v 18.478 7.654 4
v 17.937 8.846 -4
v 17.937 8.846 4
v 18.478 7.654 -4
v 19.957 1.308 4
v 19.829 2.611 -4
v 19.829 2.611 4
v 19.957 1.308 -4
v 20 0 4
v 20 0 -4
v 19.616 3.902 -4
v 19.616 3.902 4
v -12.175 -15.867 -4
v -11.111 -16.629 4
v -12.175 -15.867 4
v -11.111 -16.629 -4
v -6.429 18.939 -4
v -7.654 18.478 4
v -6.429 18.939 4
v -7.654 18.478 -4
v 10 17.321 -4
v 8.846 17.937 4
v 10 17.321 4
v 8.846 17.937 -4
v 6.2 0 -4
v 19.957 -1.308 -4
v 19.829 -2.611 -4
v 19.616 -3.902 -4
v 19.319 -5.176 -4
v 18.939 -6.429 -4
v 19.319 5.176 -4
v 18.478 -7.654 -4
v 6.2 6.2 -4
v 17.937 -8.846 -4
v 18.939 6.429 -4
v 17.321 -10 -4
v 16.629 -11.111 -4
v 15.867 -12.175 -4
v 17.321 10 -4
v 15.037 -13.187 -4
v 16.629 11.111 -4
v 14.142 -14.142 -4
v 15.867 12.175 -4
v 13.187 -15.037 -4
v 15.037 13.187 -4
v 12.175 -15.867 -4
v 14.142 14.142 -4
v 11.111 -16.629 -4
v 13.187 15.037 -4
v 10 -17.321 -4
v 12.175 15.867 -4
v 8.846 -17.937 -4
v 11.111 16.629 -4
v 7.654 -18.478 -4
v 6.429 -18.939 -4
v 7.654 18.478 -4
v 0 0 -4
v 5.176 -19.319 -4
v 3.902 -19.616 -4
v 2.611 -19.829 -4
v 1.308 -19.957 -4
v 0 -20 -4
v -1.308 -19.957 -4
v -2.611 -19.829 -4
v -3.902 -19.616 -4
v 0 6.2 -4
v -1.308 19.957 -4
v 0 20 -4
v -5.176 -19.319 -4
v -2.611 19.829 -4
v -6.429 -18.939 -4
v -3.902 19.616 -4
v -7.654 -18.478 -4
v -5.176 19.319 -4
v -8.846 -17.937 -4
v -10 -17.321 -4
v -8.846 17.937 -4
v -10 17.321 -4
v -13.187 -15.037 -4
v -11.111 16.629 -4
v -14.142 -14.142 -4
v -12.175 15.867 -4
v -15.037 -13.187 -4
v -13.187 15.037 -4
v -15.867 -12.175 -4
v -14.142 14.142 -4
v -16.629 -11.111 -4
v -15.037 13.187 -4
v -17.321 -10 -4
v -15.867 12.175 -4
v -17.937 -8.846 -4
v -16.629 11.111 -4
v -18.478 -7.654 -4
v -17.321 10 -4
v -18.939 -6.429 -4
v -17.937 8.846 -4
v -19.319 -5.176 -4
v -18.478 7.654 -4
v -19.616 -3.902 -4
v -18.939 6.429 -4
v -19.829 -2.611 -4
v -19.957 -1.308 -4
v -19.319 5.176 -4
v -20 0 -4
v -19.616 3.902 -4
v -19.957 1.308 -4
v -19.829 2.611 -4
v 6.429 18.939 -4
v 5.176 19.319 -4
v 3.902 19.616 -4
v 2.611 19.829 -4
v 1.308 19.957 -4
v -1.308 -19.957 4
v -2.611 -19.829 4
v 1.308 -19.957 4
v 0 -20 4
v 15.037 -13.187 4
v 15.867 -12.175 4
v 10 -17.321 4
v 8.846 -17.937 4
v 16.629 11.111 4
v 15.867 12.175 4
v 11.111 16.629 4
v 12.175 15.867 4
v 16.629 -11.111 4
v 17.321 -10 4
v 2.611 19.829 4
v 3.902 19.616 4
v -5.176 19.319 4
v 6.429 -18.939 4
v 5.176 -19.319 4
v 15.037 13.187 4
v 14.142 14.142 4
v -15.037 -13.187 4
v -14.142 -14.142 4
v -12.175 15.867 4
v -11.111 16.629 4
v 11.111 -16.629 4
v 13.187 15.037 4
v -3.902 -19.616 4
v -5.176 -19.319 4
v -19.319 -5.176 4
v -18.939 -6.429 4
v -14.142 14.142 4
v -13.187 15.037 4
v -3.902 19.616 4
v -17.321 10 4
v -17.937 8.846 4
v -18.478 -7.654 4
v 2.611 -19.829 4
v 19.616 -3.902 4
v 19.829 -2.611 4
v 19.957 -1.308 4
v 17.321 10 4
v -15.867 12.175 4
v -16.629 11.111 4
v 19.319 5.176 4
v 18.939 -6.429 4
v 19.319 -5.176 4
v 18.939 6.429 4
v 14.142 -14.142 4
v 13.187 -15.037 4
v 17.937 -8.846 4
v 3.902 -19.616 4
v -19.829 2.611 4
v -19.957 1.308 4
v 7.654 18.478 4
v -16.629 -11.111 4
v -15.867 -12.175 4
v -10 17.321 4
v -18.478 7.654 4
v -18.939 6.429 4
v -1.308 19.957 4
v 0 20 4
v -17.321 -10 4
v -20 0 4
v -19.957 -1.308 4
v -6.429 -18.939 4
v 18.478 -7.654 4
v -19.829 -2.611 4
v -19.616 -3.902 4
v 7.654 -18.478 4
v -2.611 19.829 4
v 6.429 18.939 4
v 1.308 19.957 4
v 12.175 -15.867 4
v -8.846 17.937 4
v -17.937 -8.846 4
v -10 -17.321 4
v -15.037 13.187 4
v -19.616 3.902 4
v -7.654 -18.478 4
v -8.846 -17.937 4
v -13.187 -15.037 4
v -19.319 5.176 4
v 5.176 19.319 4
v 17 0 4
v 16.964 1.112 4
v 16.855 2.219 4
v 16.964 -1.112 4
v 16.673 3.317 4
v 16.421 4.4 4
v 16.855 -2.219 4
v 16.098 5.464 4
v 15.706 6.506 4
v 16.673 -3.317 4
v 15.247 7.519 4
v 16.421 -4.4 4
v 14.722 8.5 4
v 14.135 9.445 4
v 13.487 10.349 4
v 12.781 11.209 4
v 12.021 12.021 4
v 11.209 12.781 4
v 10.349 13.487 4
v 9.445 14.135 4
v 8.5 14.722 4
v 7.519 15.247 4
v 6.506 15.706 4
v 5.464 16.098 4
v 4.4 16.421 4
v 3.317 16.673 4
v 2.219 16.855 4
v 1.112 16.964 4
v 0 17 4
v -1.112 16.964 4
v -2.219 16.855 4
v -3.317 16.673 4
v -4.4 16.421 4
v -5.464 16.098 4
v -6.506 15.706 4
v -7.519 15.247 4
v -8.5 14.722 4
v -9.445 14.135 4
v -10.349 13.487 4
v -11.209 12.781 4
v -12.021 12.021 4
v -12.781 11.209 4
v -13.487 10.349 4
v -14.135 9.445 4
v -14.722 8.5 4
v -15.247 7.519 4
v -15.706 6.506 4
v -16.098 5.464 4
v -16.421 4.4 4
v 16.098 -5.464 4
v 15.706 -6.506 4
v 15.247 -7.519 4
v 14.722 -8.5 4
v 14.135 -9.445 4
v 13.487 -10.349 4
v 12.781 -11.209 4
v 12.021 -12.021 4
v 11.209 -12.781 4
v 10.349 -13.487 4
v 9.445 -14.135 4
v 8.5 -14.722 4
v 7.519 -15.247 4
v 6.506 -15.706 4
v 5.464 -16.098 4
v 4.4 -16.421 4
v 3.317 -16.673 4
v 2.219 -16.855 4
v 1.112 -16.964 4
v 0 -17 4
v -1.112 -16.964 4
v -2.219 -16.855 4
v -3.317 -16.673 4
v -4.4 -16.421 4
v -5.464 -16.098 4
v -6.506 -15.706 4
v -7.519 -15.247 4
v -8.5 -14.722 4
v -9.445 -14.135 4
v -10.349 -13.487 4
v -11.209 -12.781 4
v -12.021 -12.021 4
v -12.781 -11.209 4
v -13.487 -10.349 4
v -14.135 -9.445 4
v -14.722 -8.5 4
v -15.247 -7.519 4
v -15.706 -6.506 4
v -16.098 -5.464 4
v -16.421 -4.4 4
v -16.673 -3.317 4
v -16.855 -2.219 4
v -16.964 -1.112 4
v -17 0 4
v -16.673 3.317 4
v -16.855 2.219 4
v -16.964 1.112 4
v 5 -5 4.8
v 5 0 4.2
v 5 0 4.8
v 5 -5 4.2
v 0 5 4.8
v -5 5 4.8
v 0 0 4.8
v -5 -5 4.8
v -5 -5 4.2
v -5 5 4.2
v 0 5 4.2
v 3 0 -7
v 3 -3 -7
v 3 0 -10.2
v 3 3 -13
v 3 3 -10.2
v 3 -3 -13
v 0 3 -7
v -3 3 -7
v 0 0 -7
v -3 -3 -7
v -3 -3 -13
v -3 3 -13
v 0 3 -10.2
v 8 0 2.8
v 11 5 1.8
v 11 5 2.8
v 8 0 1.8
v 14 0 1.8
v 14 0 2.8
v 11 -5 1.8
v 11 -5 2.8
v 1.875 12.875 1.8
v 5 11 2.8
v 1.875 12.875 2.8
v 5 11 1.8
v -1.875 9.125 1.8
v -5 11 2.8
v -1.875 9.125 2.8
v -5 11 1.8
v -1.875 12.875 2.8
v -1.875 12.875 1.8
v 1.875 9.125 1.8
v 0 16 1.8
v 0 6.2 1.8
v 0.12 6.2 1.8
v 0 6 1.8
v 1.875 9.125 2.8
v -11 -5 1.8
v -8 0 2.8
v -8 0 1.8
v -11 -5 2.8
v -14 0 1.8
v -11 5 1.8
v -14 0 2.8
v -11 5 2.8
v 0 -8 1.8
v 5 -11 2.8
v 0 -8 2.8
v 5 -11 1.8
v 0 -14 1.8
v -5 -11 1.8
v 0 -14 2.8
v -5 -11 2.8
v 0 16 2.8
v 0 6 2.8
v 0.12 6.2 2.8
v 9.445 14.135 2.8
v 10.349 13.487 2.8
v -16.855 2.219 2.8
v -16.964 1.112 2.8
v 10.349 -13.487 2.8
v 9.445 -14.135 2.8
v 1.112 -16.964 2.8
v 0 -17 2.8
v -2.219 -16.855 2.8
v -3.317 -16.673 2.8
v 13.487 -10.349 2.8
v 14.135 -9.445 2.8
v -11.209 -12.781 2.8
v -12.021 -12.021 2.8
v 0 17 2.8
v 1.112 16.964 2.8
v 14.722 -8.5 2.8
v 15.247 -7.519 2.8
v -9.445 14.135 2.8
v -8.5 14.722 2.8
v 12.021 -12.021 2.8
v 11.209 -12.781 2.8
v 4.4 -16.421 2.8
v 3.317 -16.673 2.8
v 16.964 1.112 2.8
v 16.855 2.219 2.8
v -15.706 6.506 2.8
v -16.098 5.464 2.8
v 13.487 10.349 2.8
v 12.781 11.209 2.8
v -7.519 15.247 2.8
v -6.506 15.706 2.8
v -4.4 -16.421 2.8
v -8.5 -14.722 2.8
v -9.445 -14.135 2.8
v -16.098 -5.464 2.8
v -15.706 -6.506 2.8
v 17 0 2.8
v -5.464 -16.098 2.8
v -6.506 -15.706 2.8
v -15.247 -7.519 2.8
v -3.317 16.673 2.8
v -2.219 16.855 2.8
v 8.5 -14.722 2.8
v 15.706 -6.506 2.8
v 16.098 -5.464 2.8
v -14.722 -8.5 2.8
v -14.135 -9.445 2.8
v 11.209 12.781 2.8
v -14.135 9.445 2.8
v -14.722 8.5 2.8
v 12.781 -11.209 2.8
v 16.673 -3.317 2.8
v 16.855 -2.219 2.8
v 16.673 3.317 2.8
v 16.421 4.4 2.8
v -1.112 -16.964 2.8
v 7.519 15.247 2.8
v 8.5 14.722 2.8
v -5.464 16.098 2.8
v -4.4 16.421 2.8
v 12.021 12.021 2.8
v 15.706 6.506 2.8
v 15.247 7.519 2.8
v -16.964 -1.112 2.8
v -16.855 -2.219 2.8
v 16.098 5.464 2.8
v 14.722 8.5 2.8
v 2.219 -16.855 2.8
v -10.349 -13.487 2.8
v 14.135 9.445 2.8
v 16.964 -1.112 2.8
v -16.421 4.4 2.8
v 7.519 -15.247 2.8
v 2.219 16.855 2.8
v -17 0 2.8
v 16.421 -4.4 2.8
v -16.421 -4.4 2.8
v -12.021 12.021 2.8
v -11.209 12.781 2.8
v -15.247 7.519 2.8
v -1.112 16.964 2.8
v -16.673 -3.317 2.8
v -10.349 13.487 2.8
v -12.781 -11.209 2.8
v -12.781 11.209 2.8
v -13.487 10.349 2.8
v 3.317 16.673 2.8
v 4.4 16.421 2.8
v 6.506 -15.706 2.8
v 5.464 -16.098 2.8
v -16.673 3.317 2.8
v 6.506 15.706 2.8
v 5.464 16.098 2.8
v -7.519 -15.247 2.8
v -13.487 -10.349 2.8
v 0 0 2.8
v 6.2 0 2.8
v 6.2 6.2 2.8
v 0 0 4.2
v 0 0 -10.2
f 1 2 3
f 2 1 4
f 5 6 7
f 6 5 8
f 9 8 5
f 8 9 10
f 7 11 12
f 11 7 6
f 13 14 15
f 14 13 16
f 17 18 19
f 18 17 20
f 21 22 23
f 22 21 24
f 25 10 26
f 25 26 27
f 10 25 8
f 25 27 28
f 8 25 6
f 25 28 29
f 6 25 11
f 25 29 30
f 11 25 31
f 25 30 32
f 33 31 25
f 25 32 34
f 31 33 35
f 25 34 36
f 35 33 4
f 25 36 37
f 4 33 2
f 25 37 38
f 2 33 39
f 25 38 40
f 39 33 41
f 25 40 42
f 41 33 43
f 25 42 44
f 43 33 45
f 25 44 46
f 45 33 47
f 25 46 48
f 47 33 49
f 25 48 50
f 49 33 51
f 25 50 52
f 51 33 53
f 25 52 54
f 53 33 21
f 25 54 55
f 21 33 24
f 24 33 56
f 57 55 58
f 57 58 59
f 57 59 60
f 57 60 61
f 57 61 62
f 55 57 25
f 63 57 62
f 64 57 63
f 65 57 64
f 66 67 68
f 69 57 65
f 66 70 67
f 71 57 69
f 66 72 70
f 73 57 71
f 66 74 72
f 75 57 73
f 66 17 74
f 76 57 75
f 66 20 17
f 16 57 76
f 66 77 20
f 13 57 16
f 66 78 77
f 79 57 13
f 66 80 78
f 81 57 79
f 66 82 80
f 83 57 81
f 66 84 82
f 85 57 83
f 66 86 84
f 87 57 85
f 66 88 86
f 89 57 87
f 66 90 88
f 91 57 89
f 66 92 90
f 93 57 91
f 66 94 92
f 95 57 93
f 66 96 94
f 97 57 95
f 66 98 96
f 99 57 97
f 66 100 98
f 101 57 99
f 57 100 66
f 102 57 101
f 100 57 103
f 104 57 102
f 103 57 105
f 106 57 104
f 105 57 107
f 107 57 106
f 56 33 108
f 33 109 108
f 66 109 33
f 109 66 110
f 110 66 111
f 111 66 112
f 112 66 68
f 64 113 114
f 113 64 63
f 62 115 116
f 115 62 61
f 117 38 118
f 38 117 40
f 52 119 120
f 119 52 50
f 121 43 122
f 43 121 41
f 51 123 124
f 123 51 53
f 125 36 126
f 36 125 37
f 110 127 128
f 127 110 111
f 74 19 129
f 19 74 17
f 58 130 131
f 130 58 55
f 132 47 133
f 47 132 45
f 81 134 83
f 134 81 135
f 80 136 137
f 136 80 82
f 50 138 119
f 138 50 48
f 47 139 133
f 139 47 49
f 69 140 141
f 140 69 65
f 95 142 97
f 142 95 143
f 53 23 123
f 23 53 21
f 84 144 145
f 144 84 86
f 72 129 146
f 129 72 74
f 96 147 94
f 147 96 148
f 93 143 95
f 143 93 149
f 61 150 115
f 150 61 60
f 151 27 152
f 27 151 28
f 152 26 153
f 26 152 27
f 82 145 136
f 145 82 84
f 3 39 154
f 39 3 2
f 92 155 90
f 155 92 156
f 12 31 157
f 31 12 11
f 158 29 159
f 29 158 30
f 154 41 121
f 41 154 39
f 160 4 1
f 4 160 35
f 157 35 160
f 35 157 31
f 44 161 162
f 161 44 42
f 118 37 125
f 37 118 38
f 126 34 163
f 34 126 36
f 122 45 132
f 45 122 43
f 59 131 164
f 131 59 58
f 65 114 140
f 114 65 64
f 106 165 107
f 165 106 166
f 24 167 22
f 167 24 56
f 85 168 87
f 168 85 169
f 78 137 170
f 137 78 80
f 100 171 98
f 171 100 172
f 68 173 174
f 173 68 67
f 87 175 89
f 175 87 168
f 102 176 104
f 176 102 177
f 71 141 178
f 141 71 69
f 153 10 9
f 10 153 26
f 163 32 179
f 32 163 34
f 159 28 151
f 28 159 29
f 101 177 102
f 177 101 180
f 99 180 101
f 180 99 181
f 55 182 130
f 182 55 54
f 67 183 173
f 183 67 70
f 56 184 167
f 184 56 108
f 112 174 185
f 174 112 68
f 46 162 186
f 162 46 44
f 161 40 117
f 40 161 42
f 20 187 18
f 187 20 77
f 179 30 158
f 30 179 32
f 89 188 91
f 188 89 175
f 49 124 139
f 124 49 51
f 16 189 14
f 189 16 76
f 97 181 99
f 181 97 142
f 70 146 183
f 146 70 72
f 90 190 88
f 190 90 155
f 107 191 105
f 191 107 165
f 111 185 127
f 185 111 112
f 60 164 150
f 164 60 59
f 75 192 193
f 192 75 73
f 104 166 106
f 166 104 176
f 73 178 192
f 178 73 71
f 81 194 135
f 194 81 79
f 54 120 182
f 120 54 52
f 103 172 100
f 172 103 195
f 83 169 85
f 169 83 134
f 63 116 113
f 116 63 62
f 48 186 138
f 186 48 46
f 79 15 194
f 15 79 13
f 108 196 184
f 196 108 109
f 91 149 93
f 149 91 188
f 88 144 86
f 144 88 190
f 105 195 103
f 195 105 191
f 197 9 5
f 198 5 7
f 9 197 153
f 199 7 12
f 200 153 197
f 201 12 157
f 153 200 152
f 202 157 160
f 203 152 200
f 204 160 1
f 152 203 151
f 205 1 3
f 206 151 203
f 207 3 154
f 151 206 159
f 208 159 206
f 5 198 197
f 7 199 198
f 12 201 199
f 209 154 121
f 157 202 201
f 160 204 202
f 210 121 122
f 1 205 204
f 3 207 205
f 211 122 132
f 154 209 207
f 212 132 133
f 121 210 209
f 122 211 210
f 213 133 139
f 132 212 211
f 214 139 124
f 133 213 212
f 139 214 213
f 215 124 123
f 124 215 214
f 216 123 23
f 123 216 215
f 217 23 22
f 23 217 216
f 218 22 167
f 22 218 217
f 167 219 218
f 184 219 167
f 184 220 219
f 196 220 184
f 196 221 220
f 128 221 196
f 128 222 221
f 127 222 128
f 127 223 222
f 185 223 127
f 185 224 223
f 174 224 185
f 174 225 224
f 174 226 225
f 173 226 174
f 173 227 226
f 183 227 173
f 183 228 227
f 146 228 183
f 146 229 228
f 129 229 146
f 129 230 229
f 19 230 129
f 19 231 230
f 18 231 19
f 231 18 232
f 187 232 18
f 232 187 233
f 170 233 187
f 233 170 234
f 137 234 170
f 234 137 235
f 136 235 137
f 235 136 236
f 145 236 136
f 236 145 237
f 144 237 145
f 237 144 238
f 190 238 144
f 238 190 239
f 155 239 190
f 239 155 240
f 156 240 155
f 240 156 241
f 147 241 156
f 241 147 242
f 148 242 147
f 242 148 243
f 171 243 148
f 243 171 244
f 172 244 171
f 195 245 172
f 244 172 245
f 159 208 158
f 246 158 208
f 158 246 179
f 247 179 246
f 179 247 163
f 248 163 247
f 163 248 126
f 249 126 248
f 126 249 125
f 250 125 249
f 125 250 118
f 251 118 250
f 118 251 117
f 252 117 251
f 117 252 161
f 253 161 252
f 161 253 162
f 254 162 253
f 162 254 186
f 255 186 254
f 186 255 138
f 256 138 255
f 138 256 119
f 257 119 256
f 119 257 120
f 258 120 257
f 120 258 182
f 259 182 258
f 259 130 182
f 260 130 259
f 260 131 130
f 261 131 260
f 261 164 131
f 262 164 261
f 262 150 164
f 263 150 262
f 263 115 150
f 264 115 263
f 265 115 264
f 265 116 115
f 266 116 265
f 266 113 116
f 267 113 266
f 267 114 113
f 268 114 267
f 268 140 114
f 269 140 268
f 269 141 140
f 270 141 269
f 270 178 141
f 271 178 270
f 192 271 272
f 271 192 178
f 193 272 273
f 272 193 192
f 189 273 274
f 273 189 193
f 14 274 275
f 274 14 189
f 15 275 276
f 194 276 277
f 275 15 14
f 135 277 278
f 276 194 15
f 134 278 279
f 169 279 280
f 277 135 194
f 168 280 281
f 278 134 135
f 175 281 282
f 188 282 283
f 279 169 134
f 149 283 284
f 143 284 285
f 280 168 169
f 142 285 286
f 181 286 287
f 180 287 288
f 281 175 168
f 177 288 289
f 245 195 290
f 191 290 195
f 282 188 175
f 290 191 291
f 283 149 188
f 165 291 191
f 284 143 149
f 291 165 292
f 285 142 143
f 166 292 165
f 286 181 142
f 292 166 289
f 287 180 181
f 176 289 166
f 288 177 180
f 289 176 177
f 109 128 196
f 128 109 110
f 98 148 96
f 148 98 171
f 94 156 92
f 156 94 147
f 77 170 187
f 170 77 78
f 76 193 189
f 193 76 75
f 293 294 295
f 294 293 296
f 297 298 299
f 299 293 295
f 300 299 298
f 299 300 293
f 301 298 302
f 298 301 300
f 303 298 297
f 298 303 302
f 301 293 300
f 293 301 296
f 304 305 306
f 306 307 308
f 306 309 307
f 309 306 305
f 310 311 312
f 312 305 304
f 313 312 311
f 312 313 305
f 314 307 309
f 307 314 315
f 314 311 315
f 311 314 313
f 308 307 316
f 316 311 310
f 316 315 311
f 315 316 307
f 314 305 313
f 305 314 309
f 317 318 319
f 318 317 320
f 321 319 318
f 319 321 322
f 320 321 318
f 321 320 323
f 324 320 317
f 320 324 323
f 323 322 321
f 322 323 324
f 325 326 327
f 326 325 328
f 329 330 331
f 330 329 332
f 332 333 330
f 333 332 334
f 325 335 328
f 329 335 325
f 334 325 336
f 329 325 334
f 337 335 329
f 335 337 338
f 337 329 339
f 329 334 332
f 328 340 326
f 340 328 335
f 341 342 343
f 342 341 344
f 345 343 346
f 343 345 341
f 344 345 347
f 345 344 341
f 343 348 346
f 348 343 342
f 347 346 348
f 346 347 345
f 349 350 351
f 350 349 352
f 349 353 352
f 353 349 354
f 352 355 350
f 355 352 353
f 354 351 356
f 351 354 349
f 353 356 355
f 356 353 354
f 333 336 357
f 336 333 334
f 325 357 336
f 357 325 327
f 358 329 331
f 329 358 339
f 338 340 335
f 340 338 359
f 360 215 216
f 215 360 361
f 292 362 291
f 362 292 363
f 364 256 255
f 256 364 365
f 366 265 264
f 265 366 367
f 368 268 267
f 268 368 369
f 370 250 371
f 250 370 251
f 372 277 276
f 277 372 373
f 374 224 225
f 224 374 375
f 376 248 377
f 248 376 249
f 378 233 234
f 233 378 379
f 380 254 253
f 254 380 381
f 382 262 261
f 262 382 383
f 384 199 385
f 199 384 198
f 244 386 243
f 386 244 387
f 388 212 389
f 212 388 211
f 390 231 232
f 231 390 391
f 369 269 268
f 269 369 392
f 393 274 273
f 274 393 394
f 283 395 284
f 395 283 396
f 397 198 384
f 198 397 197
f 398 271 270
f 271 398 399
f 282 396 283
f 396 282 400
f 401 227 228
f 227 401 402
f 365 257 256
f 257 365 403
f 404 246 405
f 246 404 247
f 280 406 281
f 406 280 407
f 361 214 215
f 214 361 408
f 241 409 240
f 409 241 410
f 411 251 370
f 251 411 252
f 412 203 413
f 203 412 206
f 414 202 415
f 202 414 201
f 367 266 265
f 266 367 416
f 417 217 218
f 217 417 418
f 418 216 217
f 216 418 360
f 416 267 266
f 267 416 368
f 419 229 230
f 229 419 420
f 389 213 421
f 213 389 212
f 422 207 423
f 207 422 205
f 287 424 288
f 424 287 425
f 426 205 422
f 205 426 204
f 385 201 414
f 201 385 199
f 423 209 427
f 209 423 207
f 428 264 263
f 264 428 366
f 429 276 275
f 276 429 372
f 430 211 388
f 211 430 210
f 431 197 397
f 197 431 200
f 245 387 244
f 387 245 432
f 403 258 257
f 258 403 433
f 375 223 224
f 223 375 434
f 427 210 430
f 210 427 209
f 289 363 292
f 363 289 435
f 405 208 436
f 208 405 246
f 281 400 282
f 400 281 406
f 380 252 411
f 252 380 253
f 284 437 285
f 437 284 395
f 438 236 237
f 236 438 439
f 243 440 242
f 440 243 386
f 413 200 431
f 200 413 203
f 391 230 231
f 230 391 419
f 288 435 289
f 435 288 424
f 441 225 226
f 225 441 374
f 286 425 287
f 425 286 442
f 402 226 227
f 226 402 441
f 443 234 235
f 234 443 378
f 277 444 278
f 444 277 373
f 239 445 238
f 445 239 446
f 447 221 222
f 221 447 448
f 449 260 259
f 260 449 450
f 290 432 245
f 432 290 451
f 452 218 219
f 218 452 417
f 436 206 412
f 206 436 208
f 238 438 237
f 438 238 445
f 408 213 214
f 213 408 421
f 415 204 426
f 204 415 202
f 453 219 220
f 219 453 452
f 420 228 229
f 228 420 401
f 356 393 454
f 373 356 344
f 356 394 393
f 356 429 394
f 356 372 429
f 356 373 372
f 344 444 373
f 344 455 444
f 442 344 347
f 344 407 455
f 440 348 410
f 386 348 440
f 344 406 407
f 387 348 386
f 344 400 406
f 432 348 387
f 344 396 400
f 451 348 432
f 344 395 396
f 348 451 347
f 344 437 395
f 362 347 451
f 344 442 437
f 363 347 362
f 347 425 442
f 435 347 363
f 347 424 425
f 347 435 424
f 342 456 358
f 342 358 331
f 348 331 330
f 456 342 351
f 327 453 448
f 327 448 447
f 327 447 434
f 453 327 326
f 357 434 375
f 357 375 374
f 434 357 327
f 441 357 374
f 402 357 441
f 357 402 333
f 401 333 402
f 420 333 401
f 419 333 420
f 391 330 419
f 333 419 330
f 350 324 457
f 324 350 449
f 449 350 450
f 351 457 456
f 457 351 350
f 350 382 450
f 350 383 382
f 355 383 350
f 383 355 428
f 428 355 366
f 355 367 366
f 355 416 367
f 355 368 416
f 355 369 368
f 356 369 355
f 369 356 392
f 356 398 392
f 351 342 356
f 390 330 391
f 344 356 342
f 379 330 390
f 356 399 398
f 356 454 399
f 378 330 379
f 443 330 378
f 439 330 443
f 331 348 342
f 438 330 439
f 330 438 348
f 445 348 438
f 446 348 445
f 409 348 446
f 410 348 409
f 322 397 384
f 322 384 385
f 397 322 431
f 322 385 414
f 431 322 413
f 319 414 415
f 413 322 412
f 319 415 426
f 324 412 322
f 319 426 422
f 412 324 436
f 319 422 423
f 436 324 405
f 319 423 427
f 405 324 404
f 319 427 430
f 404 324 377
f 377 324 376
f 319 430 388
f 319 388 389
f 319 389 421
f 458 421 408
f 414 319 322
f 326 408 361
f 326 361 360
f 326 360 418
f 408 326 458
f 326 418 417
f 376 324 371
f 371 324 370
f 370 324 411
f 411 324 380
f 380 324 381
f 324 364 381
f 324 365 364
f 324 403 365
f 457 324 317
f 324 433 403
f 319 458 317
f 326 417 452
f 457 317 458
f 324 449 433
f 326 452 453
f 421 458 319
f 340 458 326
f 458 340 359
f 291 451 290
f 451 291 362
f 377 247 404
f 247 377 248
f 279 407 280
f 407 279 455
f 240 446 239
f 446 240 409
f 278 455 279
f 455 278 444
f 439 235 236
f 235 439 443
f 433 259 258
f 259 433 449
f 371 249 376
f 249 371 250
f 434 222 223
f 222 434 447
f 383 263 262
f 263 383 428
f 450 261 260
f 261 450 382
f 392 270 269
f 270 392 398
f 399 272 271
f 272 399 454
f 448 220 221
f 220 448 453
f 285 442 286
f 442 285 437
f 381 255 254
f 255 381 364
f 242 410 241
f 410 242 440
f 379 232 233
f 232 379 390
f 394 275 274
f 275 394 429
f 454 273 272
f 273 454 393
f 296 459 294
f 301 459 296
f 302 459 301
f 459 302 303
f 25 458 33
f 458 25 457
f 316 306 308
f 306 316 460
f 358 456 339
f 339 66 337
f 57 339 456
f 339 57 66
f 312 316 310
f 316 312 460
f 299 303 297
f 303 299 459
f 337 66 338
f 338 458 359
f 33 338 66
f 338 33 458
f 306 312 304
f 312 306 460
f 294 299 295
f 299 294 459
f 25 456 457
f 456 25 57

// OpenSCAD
$fn=96;

disk_d = 40;
disk_h = 8;

rim_recess_d = 34;
rim_recess_depth = 1.2;

center_boss_size = 10;
center_boss_h = 1.6;

center_square_hole = 6.2;

peg_size = 6;
peg_h = 6;

diamond_w = 6;
diamond_h = 10;
diamond_cut_depth = 2.2;

diamond_r = 11;

module diamond2d(w,h){
    polygon(points=[
        [0, h/2],
        [w/2, 0],
        [0, -h/2],
        [-w/2, 0]
    ]);
}

module diamond_cut(pos=[0,0], rot=0, depth=2){
    translate([pos[0], pos[1], disk_h - depth])
        rotate([0,0,rot])
            linear_extrude(height=depth+0.2)
                diamond2d(diamond_w, diamond_h);
}

module face_pattern_cuts(){
    diamond_cut([0, diamond_r], 0, diamond_cut_depth);
    for(a=[0:90:270]){
        diamond_cut([diamond_r*cos(a), diamond_r*sin(a)], a, diamond_cut_depth);
    }
}

module main_body(){
    difference(){
        union(){
            cylinder(d=disk_d, h=disk_h, center=false);
            translate([0,0,disk_h])
                cube([center_boss_size, center_boss_size, center_boss_h], center=true);
            translate([0,0,-peg_h])
                cube([peg_size, peg_size, peg_h], center=true);
        }

        translate([0,0,disk_h - rim_recess_depth])
            cylinder(d=rim_recess_d, h=rim_recess_depth+0.2, center=false);

        face_pattern_cuts();

        translate([0,0,-peg_h-0.2])
            cube([center_square_hole, center_square_hole, disk_h + peg_h + center_boss_h + 0.6], center=false);
    }
}

translate([0,0,-disk_h/2])
    main_body();
